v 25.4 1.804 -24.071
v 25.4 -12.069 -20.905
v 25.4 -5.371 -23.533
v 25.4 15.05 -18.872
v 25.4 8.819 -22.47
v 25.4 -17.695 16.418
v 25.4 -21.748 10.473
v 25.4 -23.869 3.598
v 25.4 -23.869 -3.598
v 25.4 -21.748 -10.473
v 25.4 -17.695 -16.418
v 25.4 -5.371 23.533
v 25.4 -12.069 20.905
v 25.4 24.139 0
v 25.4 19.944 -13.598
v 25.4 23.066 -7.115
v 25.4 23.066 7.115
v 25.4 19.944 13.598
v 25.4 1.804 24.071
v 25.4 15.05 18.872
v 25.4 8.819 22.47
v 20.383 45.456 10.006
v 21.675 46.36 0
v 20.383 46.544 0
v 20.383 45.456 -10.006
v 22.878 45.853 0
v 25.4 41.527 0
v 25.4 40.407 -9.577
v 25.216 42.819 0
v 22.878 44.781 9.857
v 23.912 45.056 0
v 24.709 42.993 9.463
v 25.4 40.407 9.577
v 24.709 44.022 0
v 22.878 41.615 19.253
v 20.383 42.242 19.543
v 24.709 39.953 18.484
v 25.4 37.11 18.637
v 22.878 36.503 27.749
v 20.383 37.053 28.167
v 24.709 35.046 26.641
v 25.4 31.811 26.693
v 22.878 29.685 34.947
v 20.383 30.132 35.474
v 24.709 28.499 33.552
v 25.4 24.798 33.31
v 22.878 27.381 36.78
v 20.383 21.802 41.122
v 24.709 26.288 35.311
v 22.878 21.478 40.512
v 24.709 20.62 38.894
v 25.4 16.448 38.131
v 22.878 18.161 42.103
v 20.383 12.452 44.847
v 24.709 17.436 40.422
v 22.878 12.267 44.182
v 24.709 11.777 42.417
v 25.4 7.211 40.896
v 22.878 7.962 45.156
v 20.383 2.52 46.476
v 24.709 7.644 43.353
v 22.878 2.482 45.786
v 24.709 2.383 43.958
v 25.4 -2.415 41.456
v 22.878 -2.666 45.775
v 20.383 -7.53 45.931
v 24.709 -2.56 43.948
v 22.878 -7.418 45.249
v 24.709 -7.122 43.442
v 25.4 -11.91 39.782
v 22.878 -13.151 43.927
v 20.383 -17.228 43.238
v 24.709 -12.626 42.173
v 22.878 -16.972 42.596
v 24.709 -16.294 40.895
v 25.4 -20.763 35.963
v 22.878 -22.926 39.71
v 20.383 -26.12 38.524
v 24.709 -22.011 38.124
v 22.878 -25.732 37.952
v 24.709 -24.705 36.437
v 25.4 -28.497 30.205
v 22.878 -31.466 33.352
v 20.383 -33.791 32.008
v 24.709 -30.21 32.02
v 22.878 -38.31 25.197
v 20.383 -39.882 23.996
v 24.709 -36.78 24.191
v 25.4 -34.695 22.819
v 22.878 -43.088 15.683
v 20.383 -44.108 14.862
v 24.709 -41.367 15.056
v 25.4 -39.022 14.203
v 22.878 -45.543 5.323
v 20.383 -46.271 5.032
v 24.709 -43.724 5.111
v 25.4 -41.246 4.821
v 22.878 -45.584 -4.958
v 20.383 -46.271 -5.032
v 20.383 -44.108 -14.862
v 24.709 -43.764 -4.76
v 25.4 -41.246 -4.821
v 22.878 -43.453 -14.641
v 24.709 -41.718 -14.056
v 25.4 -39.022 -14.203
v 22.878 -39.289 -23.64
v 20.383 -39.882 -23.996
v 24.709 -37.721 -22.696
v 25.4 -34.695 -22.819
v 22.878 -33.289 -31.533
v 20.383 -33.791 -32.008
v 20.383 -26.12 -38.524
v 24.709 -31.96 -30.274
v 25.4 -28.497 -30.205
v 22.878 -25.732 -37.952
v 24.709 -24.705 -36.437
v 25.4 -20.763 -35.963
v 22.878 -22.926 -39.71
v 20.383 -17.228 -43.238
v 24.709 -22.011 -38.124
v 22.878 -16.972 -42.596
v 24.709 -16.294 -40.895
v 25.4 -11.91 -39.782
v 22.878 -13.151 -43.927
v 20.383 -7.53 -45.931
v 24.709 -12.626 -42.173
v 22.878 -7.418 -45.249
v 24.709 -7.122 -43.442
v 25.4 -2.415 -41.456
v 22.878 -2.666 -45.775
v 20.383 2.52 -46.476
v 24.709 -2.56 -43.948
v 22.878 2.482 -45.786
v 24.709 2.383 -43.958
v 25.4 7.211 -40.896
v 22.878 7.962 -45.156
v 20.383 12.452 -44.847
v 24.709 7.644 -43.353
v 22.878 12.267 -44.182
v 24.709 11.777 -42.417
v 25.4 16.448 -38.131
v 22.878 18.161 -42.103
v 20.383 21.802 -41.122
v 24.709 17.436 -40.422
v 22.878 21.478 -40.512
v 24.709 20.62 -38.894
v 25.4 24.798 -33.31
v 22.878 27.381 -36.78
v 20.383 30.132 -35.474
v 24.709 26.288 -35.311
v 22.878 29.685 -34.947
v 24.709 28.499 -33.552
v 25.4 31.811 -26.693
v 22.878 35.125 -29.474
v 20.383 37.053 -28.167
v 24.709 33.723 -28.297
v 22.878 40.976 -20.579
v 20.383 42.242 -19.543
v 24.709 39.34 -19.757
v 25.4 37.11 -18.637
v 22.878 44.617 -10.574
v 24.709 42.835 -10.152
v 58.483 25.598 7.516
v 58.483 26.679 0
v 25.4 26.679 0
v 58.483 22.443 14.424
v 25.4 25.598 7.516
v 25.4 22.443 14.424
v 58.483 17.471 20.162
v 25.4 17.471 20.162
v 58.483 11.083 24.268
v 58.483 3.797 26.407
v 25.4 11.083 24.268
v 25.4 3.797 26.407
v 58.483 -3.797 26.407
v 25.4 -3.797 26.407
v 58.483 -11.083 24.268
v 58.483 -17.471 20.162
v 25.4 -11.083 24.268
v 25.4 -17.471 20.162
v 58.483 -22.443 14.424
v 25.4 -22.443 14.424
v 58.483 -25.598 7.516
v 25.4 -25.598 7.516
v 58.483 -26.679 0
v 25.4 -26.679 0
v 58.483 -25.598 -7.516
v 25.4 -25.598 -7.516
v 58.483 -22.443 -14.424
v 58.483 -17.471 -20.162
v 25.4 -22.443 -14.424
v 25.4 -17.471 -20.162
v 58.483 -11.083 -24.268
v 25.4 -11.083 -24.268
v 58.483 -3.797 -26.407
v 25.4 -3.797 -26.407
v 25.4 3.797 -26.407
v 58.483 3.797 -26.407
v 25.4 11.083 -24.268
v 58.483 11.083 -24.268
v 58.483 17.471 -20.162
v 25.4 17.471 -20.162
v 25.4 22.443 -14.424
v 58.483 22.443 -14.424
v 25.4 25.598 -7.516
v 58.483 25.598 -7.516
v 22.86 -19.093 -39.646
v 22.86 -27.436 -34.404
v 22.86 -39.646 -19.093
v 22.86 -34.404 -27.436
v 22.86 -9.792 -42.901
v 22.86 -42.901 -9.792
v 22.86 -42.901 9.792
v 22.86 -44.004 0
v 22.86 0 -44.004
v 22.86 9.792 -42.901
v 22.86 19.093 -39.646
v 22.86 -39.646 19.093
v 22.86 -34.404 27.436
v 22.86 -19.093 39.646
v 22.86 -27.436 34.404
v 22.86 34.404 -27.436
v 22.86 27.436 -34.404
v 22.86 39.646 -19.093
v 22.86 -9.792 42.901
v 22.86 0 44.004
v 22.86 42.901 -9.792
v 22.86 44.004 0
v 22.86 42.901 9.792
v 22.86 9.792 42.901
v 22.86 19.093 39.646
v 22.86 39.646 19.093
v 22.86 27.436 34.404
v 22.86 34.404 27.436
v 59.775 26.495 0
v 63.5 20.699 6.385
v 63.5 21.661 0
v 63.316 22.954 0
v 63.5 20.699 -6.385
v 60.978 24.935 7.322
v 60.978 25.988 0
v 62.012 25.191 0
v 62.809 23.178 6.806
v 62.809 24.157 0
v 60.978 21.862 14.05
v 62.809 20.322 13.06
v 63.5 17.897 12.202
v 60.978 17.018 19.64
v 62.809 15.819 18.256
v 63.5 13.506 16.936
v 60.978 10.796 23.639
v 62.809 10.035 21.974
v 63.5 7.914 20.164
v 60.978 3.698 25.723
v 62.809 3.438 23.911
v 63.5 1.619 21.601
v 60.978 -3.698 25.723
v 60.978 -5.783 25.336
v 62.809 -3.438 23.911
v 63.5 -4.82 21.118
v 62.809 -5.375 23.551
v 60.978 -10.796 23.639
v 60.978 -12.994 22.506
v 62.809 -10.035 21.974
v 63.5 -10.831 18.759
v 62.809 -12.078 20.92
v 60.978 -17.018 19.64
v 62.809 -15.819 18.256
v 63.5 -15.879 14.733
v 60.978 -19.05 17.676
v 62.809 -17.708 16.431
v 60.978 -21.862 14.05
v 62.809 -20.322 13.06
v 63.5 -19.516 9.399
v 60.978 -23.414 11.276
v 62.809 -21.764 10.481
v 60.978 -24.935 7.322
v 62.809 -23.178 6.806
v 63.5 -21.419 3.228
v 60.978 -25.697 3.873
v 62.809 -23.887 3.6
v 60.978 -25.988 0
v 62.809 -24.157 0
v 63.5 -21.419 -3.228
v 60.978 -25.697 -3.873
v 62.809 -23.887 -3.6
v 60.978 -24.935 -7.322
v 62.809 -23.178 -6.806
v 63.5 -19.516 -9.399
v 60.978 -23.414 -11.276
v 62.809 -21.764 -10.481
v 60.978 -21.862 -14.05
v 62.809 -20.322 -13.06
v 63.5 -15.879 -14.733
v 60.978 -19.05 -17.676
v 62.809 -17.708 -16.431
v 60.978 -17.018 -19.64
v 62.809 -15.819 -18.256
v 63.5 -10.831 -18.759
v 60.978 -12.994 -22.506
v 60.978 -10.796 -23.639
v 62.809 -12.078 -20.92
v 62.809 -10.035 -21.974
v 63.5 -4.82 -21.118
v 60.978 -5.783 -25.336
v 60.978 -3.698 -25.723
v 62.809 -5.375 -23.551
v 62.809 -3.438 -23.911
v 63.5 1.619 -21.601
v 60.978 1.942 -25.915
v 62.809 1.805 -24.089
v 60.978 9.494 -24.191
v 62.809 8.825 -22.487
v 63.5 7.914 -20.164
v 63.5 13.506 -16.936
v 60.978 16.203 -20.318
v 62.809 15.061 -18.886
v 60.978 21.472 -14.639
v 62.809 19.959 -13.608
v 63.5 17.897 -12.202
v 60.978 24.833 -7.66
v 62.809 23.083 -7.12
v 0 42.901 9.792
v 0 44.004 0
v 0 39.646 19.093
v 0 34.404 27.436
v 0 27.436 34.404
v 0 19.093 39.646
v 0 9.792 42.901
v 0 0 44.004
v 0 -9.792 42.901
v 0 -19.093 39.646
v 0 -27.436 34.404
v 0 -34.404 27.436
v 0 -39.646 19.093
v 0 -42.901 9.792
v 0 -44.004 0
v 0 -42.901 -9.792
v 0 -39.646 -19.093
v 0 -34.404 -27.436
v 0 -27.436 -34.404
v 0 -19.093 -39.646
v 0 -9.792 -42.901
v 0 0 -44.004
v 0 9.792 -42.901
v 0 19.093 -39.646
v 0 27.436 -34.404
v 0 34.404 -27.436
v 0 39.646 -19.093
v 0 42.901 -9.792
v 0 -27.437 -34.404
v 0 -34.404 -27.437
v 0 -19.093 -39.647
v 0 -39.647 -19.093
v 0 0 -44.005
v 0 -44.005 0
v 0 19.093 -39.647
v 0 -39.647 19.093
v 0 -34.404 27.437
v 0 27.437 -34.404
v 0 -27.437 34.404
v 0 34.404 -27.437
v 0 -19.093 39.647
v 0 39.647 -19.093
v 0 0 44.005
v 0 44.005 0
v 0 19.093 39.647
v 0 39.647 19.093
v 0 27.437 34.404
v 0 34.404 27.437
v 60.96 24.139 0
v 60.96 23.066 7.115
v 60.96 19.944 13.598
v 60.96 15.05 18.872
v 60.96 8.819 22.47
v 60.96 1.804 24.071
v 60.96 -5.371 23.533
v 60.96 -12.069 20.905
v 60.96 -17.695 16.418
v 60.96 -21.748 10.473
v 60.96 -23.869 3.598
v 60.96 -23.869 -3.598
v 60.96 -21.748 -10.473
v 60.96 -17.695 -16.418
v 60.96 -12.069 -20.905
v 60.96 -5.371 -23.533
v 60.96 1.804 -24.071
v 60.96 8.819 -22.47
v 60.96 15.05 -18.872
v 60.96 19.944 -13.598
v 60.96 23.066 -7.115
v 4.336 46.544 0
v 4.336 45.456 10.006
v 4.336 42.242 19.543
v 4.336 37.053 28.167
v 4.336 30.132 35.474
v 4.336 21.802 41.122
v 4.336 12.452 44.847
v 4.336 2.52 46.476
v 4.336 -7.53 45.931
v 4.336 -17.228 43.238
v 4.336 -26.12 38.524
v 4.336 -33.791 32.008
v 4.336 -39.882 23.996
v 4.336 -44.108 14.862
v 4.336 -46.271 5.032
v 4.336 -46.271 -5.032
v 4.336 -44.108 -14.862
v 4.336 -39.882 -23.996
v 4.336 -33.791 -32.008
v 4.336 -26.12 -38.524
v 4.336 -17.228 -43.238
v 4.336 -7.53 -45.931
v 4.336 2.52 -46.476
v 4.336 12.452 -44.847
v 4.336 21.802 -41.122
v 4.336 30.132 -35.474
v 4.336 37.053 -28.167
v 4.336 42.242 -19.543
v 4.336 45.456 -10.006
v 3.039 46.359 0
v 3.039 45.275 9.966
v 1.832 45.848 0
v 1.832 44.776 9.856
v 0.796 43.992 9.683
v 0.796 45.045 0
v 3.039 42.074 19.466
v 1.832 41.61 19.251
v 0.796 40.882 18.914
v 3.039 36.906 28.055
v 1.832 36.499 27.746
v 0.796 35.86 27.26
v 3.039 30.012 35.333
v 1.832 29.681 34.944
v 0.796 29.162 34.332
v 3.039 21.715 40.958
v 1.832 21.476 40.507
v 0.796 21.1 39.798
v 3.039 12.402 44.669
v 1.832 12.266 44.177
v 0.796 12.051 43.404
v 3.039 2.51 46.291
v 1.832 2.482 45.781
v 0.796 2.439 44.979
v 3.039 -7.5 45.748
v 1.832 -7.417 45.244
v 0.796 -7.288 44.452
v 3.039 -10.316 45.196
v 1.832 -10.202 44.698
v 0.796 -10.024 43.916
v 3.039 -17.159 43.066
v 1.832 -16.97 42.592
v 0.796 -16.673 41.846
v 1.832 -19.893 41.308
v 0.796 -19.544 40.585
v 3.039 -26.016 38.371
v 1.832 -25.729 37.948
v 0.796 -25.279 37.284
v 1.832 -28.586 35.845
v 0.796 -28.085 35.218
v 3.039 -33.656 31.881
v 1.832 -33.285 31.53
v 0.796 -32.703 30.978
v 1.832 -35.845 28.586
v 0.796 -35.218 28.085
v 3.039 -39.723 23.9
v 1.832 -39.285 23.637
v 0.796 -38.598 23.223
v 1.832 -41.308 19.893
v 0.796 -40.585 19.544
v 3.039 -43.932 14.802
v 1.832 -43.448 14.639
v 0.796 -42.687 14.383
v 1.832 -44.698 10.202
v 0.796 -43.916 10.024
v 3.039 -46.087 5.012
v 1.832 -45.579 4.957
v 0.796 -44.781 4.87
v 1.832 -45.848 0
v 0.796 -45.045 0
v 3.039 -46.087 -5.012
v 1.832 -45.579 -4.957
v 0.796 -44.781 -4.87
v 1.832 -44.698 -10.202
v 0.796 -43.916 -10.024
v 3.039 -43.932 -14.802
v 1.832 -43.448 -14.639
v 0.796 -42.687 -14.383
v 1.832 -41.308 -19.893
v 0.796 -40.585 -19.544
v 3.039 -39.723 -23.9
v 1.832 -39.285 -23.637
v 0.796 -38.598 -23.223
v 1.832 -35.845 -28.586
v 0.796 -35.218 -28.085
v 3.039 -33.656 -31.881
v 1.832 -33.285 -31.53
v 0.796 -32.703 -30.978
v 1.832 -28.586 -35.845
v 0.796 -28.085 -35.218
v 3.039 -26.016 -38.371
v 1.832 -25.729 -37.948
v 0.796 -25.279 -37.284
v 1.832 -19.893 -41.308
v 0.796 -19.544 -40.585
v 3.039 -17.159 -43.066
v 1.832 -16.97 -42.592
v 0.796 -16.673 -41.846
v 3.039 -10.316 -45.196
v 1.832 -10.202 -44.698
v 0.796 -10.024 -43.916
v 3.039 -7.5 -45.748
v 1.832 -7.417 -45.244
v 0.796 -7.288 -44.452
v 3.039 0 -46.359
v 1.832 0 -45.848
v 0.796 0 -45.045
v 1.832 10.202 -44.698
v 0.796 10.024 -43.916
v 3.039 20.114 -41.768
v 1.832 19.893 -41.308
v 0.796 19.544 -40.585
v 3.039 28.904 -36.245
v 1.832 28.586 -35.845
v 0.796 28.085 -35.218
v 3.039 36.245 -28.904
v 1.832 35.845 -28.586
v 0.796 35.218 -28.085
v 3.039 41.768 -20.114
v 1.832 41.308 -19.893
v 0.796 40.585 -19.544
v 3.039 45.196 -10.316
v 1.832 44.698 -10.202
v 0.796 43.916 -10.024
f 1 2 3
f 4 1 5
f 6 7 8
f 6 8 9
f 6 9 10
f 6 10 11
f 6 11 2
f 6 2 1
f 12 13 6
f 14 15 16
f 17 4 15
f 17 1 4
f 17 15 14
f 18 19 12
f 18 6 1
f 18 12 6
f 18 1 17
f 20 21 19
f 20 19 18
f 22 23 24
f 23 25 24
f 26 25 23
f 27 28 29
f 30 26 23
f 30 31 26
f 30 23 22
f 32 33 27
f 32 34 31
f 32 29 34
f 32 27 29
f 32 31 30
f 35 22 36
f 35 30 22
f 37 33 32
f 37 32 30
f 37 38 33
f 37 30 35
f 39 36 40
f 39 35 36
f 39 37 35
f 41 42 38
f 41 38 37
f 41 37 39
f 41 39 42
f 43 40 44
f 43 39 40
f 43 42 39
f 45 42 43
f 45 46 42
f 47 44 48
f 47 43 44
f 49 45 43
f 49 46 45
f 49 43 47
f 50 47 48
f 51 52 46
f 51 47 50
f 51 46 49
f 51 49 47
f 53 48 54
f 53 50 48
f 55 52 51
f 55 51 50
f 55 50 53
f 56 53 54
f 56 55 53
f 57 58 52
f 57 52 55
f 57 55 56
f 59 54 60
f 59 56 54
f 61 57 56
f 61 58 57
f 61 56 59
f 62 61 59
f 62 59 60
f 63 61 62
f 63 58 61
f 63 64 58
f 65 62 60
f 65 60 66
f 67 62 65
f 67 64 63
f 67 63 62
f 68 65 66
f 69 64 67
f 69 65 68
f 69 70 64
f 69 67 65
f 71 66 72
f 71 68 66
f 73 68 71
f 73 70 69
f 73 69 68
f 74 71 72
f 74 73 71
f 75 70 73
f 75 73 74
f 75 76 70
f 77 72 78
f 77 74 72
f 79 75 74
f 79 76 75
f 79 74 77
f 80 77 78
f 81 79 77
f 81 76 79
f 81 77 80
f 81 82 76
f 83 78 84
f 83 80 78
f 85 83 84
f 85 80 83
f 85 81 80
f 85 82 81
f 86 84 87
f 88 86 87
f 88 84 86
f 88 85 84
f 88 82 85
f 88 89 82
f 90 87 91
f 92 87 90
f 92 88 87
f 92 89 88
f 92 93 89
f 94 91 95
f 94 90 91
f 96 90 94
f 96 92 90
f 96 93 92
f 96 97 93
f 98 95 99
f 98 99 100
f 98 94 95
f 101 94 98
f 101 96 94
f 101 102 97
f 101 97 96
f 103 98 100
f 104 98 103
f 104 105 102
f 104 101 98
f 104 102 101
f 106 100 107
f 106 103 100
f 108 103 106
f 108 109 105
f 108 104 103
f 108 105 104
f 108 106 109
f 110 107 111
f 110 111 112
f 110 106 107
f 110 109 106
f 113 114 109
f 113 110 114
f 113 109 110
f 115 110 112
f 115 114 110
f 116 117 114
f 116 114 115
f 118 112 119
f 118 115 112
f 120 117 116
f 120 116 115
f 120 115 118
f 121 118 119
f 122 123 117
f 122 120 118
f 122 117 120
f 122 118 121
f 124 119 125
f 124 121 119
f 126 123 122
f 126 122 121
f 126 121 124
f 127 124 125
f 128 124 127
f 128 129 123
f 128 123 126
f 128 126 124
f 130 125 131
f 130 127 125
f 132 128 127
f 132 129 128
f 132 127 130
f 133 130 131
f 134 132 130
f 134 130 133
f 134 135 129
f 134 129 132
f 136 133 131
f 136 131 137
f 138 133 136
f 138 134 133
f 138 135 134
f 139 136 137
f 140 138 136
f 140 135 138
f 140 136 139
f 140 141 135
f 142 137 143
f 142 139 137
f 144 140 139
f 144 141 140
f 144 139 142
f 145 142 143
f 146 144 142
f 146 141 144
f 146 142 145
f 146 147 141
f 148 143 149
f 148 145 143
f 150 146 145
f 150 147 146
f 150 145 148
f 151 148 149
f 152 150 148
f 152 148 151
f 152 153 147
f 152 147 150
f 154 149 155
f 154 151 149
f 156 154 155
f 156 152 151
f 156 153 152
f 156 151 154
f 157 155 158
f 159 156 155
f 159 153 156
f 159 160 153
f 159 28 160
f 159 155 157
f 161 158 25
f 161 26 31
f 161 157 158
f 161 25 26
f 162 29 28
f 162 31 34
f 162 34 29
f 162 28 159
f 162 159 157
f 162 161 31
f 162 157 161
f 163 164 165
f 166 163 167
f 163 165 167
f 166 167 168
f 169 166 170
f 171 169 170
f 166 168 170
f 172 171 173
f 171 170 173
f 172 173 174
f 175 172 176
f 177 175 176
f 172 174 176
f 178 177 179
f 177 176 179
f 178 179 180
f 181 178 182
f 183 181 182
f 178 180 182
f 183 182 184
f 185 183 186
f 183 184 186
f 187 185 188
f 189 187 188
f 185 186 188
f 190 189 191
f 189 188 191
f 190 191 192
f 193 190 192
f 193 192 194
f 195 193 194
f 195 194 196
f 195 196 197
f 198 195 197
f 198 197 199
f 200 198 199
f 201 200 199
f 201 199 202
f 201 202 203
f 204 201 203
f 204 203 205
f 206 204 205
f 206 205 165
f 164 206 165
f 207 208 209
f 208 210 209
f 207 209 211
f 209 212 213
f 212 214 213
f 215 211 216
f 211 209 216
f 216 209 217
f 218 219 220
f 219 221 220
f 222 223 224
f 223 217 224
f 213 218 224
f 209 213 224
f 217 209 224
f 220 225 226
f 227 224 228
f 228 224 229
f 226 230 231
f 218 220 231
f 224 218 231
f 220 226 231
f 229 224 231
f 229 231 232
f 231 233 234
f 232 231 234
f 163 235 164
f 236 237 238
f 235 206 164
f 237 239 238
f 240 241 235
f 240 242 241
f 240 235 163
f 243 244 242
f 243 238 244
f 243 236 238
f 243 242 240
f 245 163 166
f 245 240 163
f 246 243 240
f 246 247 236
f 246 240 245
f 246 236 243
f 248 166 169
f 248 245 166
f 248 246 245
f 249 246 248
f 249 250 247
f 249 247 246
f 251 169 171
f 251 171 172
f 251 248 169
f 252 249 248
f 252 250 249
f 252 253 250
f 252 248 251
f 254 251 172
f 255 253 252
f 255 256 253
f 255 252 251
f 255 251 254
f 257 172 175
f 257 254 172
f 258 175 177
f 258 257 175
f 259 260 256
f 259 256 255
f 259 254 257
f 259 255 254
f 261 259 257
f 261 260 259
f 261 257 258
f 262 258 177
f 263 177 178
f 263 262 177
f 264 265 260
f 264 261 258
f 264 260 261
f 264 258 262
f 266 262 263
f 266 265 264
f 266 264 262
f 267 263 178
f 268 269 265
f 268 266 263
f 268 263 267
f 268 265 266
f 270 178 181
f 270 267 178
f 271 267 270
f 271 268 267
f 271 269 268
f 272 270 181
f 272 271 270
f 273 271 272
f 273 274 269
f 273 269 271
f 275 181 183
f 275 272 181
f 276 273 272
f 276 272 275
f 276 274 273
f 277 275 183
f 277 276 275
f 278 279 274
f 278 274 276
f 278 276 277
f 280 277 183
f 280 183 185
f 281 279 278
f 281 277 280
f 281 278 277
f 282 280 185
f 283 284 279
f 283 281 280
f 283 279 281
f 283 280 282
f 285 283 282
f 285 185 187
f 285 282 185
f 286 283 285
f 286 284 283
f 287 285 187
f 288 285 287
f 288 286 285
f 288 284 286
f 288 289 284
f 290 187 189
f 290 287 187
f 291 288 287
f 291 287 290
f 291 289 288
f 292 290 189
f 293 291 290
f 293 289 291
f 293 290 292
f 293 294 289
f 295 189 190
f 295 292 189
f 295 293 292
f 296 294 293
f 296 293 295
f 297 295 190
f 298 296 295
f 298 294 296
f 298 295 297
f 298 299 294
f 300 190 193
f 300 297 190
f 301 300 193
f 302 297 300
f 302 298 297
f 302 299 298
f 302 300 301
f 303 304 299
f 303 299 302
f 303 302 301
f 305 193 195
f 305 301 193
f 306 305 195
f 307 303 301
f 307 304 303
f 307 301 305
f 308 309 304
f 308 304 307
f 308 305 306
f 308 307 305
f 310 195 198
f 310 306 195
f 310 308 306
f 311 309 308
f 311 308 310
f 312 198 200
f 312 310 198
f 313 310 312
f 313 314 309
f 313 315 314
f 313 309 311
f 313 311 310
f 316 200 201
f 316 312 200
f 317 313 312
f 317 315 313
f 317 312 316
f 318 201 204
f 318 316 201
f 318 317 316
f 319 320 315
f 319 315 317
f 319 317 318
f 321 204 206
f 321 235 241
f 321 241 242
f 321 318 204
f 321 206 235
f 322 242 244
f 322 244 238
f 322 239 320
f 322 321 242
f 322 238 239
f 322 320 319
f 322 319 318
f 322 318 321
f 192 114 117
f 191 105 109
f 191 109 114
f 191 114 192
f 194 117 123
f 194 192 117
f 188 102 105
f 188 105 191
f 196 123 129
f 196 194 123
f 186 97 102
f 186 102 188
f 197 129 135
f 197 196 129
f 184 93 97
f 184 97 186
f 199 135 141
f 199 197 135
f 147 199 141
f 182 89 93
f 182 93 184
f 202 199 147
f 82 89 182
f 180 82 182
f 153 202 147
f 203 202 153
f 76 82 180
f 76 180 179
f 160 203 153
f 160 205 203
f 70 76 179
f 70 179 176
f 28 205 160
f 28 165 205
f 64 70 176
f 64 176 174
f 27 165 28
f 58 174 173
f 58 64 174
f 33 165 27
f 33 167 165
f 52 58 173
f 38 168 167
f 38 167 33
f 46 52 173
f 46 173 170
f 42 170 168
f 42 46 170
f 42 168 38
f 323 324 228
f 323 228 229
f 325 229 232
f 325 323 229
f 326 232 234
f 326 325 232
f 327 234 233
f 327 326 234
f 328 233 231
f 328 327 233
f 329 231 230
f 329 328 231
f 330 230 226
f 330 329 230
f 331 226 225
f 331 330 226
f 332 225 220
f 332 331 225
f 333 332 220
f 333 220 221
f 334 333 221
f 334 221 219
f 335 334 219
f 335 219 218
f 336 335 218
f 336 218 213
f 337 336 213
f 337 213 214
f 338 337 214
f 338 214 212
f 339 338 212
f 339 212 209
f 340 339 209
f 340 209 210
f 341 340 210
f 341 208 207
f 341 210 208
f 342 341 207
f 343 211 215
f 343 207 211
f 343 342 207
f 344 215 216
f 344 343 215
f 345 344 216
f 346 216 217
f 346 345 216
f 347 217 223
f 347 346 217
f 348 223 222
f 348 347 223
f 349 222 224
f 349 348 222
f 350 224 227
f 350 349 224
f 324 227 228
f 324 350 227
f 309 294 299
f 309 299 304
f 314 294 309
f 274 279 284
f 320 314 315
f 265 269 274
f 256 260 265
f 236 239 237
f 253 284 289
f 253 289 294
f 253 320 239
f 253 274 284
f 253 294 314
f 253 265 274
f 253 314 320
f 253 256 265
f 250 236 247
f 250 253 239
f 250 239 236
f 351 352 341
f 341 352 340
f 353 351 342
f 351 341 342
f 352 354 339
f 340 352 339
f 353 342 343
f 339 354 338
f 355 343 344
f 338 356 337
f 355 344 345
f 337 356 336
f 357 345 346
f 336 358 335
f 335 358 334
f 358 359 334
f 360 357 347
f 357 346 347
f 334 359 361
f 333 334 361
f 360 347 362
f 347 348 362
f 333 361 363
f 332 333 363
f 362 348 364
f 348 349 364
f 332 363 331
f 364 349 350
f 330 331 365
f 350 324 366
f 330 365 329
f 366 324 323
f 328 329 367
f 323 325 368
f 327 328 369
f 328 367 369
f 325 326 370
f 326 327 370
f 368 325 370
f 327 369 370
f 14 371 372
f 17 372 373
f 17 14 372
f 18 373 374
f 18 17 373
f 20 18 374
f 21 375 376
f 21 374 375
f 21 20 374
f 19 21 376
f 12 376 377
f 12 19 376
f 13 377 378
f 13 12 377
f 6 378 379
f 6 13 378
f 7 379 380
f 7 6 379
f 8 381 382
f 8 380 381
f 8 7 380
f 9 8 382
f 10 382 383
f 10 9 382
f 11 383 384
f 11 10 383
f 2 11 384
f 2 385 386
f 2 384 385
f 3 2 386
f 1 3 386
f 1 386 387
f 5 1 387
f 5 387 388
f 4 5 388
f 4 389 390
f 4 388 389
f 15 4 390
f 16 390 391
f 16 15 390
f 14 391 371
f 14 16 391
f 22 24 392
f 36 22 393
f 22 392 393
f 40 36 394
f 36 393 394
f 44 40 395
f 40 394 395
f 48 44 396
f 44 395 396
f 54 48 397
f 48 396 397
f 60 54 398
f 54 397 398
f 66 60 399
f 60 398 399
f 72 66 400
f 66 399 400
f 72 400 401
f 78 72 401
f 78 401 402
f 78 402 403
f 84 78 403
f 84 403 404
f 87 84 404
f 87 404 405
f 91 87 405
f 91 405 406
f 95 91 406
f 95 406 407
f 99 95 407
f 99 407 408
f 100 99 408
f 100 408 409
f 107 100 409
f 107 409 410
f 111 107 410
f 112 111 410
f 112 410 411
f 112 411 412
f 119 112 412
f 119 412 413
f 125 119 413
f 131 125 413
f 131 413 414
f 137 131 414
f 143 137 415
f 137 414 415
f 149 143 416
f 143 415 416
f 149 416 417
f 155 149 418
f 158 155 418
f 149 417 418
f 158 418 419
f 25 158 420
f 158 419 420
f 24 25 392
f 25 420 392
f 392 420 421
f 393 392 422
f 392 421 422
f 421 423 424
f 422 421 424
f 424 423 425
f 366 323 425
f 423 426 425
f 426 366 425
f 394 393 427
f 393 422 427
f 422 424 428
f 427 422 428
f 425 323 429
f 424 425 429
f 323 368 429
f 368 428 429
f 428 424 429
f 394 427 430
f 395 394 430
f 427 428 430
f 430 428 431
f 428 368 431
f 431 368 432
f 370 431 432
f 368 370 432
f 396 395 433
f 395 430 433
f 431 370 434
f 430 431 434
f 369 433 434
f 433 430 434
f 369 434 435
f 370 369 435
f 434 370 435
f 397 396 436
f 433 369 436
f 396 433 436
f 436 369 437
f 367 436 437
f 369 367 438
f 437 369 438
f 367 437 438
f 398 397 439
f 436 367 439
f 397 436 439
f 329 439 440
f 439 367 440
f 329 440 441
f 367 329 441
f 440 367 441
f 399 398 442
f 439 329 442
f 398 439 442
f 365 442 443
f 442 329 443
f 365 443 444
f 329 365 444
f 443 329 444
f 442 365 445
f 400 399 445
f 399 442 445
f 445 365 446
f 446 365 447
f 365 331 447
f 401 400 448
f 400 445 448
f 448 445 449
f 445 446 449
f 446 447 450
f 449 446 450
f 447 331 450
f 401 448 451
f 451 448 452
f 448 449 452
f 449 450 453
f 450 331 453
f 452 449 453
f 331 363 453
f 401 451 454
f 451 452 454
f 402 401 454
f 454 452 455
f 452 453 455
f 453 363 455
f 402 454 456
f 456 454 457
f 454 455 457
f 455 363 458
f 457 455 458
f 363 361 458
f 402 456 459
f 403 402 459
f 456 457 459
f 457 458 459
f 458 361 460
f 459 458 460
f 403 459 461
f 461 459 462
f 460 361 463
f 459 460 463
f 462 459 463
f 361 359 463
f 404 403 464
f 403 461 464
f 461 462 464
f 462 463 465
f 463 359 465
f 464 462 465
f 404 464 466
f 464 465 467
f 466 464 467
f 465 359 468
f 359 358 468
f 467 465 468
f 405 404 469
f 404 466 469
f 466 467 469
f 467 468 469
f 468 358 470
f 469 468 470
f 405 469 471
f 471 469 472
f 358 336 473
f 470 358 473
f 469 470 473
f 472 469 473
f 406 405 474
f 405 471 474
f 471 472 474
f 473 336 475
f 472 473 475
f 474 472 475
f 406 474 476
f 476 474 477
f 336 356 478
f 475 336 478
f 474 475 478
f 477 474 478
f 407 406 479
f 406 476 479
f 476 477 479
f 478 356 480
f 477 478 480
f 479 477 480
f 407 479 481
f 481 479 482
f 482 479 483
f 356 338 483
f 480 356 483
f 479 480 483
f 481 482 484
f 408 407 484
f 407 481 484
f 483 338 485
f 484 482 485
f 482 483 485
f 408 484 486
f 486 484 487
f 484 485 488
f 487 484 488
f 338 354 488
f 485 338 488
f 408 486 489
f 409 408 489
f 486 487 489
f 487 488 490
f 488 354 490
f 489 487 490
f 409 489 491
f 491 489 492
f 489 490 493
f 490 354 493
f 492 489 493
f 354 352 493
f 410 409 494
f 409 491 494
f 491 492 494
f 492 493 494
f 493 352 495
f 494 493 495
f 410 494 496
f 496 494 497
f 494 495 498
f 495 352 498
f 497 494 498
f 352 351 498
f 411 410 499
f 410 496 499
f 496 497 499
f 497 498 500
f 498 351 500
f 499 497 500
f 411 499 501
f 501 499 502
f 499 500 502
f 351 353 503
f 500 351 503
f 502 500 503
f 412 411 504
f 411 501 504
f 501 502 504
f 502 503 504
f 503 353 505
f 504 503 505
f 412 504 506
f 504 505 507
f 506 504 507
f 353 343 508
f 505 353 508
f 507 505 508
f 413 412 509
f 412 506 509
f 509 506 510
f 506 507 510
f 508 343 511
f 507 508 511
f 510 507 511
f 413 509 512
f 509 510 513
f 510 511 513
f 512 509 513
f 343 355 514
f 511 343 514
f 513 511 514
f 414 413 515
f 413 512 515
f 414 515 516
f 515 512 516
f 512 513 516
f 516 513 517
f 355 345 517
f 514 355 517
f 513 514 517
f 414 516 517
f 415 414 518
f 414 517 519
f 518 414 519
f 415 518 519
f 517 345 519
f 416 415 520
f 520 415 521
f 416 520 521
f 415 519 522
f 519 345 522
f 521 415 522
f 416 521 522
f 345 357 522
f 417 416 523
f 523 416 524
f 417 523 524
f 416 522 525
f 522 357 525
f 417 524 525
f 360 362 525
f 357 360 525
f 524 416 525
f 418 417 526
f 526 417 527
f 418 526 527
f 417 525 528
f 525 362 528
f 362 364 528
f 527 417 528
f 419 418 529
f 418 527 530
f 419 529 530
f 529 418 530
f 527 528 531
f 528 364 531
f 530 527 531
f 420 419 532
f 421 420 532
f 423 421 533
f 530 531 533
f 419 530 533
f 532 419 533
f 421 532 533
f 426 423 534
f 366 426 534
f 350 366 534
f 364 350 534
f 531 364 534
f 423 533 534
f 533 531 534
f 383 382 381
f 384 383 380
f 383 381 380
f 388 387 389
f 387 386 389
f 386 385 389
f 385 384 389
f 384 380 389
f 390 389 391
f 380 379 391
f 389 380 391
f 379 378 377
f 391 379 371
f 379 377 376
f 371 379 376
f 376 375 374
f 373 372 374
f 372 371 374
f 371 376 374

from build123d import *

# Parameters (mm, degrees)
F0_R     = 46.5439630146
F1_DEPTH = 25.4
F2_T     = -2.54
F3_R     = 26.6785648963
F4_DEPTH = 38.1
F5_T     = 2.54


# Not quite as in the source:
# - a fillet or chamfer that OpenCascade refuses, or shapes differently, is made with other operations: its cross-section is extruded or revolved along the edge and cut away or added
# - a shell that OpenCascade refuses in one call is made with other operations: the cavity is built on its own and cut out


with BuildPart() as f1:
    # F0 (on Right) → F1 (new body)
    with BuildSketch(Plane.YZ):
        Circle(F0_R)
    extrude(amount=F1_DEPTH)

    # F2
    f2_openings = [f1.faces().sort_by_distance(p)[0] for p in [
        (0, 0, 0),
    ]]
    offset(amount=F2_T, openings=f2_openings)

    # F3 (on face) → F4 (join)
    with BuildSketch(Plane.YZ.offset(25.4)):
        Circle(F3_R)
    extrude(amount=F4_DEPTH)

    # F5: shell of thickness 2.54, made by hand


with BuildPart() as f5_core1:
    # F5_t2: copy of F1
    add(f1.part)

    # the walls: a layer under each face that stays
    f5_faces = [f5_core1.faces().sort_by_distance(p)[0] for p in [
        (12.7, -46.5439630146, 0),
        (0, -43.441032147, -12.4117234706),
        (11.43, -44.0039630146, 0),
        (44.45, -26.6785648963, 0),
        (22.86, 0, 0),
        (63.5, 0, 0),
    ]]
    thicken(f5_faces, amount=-F5_T, mode=Mode.SUBTRACT)

    # F5_s3 → F5_t4 (revolve, cut)
    with BuildSketch(Plane.XY):
        Polygon((22.8346, 43.9785630146), (22.86, 46.5439630146), (25.4, 46.5439630146), (25.4, 44.0039630146), align=None)
    revolve(axis=Axis((22.86, 0, 0), (-1, 0, 0)), mode=Mode.SUBTRACT)


with BuildPart() as f1_1:
    add(f1.part)

    # what is left inside the walls is the cavity
    f5_cavity = [f5_core1.part.solids().sort_by_distance(p)[0] for p in [
        (49.106667, -24.113165, 0),
    ]]
    add(f5_cavity, mode=Mode.SUBTRACT)

    # F6: fillet of radius 5.08 on 3 edges, made by hand

    # F6_s1 → F6_t2 (revolve, cut)
    with BuildSketch(Plane.XY):
        with BuildLine():
            ThreePointArc((4.3999665546, 46.5443630146), (1.8595251638, 45.8637284922), (-0.0003463882, 44.0041630527))
            Line((-0.0003463882, 44.0041630527), (-0.4403776825, 44.258279625))
            ThreePointArc((-0.4403776825, 44.258279625), (-0.5081365685, 45.2740630337), (-0.5081365685, 46.5439630146))
            Line((-0.5081365685, 46.5439630146), (0, 47.0520995832))
            ThreePointArc((0, 47.0520995832), (2.1999832773, 47.0520995832), (4.3999665546, 47.0524995832))
            Line((4.3999665546, 47.0524995832), (4.3999665546, 46.5443630146))
        make_face()
    revolve(axis=Axis((0, 0, 0), (1, 0, 0)), mode=Mode.SUBTRACT)

    # F6_s3 → F6_t4 (revolve, cut)
    with BuildSketch(Plane.XY):
        with BuildLine():
            ThreePointArc((20.3190343146, 46.5443630146), (23.9121024484, 45.0560654631), (25.4004, 41.4629973292))
            Line((25.4004, 41.4629973292), (25.9085365685, 41.4629973292))
            ThreePointArc((25.9085365685, 41.4629973292), (25.9081365685, 44.0034801719), (25.9081365685, 46.5439630146))
            Line((25.9081365685, 46.5439630146), (25.4, 47.0520995832))
            ThreePointArc((25.4, 47.0520995832), (22.8595171573, 47.0520995832), (20.3190343146, 47.0524995832))
            Line((20.3190343146, 47.0524995832), (20.3190343146, 46.5443630146))
        make_face()
    revolve(axis=Axis((25.4, 0, 0), (1, 0, 0)), mode=Mode.SUBTRACT)

    # F6_s5 → F6_t6 (revolve, cut)
    with BuildSketch(Plane.XY):
        with BuildLine():
            ThreePointArc((58.4190343146, 26.6789648963), (62.0121024484, 25.1906673448), (63.5004, 21.5975992109))
            Line((63.5004, 21.5975992109), (64.0085365685, 21.5975992109))
            ThreePointArc((64.0085365685, 21.5975992109), (64.0081365685, 24.1380820536), (64.0081365685, 26.6785648963))
            Line((64.0081365685, 26.6785648963), (63.5, 27.1867014649))
            ThreePointArc((63.5, 27.1867014649), (60.9595171573, 27.1867014649), (58.4190343146, 27.1871014649))
            Line((58.4190343146, 27.1871014649), (58.4190343146, 26.6789648963))
        make_face()
    revolve(axis=Axis((63.5, 0, 0), (1, 0, 0)), mode=Mode.SUBTRACT)


solid = f1_1.part
